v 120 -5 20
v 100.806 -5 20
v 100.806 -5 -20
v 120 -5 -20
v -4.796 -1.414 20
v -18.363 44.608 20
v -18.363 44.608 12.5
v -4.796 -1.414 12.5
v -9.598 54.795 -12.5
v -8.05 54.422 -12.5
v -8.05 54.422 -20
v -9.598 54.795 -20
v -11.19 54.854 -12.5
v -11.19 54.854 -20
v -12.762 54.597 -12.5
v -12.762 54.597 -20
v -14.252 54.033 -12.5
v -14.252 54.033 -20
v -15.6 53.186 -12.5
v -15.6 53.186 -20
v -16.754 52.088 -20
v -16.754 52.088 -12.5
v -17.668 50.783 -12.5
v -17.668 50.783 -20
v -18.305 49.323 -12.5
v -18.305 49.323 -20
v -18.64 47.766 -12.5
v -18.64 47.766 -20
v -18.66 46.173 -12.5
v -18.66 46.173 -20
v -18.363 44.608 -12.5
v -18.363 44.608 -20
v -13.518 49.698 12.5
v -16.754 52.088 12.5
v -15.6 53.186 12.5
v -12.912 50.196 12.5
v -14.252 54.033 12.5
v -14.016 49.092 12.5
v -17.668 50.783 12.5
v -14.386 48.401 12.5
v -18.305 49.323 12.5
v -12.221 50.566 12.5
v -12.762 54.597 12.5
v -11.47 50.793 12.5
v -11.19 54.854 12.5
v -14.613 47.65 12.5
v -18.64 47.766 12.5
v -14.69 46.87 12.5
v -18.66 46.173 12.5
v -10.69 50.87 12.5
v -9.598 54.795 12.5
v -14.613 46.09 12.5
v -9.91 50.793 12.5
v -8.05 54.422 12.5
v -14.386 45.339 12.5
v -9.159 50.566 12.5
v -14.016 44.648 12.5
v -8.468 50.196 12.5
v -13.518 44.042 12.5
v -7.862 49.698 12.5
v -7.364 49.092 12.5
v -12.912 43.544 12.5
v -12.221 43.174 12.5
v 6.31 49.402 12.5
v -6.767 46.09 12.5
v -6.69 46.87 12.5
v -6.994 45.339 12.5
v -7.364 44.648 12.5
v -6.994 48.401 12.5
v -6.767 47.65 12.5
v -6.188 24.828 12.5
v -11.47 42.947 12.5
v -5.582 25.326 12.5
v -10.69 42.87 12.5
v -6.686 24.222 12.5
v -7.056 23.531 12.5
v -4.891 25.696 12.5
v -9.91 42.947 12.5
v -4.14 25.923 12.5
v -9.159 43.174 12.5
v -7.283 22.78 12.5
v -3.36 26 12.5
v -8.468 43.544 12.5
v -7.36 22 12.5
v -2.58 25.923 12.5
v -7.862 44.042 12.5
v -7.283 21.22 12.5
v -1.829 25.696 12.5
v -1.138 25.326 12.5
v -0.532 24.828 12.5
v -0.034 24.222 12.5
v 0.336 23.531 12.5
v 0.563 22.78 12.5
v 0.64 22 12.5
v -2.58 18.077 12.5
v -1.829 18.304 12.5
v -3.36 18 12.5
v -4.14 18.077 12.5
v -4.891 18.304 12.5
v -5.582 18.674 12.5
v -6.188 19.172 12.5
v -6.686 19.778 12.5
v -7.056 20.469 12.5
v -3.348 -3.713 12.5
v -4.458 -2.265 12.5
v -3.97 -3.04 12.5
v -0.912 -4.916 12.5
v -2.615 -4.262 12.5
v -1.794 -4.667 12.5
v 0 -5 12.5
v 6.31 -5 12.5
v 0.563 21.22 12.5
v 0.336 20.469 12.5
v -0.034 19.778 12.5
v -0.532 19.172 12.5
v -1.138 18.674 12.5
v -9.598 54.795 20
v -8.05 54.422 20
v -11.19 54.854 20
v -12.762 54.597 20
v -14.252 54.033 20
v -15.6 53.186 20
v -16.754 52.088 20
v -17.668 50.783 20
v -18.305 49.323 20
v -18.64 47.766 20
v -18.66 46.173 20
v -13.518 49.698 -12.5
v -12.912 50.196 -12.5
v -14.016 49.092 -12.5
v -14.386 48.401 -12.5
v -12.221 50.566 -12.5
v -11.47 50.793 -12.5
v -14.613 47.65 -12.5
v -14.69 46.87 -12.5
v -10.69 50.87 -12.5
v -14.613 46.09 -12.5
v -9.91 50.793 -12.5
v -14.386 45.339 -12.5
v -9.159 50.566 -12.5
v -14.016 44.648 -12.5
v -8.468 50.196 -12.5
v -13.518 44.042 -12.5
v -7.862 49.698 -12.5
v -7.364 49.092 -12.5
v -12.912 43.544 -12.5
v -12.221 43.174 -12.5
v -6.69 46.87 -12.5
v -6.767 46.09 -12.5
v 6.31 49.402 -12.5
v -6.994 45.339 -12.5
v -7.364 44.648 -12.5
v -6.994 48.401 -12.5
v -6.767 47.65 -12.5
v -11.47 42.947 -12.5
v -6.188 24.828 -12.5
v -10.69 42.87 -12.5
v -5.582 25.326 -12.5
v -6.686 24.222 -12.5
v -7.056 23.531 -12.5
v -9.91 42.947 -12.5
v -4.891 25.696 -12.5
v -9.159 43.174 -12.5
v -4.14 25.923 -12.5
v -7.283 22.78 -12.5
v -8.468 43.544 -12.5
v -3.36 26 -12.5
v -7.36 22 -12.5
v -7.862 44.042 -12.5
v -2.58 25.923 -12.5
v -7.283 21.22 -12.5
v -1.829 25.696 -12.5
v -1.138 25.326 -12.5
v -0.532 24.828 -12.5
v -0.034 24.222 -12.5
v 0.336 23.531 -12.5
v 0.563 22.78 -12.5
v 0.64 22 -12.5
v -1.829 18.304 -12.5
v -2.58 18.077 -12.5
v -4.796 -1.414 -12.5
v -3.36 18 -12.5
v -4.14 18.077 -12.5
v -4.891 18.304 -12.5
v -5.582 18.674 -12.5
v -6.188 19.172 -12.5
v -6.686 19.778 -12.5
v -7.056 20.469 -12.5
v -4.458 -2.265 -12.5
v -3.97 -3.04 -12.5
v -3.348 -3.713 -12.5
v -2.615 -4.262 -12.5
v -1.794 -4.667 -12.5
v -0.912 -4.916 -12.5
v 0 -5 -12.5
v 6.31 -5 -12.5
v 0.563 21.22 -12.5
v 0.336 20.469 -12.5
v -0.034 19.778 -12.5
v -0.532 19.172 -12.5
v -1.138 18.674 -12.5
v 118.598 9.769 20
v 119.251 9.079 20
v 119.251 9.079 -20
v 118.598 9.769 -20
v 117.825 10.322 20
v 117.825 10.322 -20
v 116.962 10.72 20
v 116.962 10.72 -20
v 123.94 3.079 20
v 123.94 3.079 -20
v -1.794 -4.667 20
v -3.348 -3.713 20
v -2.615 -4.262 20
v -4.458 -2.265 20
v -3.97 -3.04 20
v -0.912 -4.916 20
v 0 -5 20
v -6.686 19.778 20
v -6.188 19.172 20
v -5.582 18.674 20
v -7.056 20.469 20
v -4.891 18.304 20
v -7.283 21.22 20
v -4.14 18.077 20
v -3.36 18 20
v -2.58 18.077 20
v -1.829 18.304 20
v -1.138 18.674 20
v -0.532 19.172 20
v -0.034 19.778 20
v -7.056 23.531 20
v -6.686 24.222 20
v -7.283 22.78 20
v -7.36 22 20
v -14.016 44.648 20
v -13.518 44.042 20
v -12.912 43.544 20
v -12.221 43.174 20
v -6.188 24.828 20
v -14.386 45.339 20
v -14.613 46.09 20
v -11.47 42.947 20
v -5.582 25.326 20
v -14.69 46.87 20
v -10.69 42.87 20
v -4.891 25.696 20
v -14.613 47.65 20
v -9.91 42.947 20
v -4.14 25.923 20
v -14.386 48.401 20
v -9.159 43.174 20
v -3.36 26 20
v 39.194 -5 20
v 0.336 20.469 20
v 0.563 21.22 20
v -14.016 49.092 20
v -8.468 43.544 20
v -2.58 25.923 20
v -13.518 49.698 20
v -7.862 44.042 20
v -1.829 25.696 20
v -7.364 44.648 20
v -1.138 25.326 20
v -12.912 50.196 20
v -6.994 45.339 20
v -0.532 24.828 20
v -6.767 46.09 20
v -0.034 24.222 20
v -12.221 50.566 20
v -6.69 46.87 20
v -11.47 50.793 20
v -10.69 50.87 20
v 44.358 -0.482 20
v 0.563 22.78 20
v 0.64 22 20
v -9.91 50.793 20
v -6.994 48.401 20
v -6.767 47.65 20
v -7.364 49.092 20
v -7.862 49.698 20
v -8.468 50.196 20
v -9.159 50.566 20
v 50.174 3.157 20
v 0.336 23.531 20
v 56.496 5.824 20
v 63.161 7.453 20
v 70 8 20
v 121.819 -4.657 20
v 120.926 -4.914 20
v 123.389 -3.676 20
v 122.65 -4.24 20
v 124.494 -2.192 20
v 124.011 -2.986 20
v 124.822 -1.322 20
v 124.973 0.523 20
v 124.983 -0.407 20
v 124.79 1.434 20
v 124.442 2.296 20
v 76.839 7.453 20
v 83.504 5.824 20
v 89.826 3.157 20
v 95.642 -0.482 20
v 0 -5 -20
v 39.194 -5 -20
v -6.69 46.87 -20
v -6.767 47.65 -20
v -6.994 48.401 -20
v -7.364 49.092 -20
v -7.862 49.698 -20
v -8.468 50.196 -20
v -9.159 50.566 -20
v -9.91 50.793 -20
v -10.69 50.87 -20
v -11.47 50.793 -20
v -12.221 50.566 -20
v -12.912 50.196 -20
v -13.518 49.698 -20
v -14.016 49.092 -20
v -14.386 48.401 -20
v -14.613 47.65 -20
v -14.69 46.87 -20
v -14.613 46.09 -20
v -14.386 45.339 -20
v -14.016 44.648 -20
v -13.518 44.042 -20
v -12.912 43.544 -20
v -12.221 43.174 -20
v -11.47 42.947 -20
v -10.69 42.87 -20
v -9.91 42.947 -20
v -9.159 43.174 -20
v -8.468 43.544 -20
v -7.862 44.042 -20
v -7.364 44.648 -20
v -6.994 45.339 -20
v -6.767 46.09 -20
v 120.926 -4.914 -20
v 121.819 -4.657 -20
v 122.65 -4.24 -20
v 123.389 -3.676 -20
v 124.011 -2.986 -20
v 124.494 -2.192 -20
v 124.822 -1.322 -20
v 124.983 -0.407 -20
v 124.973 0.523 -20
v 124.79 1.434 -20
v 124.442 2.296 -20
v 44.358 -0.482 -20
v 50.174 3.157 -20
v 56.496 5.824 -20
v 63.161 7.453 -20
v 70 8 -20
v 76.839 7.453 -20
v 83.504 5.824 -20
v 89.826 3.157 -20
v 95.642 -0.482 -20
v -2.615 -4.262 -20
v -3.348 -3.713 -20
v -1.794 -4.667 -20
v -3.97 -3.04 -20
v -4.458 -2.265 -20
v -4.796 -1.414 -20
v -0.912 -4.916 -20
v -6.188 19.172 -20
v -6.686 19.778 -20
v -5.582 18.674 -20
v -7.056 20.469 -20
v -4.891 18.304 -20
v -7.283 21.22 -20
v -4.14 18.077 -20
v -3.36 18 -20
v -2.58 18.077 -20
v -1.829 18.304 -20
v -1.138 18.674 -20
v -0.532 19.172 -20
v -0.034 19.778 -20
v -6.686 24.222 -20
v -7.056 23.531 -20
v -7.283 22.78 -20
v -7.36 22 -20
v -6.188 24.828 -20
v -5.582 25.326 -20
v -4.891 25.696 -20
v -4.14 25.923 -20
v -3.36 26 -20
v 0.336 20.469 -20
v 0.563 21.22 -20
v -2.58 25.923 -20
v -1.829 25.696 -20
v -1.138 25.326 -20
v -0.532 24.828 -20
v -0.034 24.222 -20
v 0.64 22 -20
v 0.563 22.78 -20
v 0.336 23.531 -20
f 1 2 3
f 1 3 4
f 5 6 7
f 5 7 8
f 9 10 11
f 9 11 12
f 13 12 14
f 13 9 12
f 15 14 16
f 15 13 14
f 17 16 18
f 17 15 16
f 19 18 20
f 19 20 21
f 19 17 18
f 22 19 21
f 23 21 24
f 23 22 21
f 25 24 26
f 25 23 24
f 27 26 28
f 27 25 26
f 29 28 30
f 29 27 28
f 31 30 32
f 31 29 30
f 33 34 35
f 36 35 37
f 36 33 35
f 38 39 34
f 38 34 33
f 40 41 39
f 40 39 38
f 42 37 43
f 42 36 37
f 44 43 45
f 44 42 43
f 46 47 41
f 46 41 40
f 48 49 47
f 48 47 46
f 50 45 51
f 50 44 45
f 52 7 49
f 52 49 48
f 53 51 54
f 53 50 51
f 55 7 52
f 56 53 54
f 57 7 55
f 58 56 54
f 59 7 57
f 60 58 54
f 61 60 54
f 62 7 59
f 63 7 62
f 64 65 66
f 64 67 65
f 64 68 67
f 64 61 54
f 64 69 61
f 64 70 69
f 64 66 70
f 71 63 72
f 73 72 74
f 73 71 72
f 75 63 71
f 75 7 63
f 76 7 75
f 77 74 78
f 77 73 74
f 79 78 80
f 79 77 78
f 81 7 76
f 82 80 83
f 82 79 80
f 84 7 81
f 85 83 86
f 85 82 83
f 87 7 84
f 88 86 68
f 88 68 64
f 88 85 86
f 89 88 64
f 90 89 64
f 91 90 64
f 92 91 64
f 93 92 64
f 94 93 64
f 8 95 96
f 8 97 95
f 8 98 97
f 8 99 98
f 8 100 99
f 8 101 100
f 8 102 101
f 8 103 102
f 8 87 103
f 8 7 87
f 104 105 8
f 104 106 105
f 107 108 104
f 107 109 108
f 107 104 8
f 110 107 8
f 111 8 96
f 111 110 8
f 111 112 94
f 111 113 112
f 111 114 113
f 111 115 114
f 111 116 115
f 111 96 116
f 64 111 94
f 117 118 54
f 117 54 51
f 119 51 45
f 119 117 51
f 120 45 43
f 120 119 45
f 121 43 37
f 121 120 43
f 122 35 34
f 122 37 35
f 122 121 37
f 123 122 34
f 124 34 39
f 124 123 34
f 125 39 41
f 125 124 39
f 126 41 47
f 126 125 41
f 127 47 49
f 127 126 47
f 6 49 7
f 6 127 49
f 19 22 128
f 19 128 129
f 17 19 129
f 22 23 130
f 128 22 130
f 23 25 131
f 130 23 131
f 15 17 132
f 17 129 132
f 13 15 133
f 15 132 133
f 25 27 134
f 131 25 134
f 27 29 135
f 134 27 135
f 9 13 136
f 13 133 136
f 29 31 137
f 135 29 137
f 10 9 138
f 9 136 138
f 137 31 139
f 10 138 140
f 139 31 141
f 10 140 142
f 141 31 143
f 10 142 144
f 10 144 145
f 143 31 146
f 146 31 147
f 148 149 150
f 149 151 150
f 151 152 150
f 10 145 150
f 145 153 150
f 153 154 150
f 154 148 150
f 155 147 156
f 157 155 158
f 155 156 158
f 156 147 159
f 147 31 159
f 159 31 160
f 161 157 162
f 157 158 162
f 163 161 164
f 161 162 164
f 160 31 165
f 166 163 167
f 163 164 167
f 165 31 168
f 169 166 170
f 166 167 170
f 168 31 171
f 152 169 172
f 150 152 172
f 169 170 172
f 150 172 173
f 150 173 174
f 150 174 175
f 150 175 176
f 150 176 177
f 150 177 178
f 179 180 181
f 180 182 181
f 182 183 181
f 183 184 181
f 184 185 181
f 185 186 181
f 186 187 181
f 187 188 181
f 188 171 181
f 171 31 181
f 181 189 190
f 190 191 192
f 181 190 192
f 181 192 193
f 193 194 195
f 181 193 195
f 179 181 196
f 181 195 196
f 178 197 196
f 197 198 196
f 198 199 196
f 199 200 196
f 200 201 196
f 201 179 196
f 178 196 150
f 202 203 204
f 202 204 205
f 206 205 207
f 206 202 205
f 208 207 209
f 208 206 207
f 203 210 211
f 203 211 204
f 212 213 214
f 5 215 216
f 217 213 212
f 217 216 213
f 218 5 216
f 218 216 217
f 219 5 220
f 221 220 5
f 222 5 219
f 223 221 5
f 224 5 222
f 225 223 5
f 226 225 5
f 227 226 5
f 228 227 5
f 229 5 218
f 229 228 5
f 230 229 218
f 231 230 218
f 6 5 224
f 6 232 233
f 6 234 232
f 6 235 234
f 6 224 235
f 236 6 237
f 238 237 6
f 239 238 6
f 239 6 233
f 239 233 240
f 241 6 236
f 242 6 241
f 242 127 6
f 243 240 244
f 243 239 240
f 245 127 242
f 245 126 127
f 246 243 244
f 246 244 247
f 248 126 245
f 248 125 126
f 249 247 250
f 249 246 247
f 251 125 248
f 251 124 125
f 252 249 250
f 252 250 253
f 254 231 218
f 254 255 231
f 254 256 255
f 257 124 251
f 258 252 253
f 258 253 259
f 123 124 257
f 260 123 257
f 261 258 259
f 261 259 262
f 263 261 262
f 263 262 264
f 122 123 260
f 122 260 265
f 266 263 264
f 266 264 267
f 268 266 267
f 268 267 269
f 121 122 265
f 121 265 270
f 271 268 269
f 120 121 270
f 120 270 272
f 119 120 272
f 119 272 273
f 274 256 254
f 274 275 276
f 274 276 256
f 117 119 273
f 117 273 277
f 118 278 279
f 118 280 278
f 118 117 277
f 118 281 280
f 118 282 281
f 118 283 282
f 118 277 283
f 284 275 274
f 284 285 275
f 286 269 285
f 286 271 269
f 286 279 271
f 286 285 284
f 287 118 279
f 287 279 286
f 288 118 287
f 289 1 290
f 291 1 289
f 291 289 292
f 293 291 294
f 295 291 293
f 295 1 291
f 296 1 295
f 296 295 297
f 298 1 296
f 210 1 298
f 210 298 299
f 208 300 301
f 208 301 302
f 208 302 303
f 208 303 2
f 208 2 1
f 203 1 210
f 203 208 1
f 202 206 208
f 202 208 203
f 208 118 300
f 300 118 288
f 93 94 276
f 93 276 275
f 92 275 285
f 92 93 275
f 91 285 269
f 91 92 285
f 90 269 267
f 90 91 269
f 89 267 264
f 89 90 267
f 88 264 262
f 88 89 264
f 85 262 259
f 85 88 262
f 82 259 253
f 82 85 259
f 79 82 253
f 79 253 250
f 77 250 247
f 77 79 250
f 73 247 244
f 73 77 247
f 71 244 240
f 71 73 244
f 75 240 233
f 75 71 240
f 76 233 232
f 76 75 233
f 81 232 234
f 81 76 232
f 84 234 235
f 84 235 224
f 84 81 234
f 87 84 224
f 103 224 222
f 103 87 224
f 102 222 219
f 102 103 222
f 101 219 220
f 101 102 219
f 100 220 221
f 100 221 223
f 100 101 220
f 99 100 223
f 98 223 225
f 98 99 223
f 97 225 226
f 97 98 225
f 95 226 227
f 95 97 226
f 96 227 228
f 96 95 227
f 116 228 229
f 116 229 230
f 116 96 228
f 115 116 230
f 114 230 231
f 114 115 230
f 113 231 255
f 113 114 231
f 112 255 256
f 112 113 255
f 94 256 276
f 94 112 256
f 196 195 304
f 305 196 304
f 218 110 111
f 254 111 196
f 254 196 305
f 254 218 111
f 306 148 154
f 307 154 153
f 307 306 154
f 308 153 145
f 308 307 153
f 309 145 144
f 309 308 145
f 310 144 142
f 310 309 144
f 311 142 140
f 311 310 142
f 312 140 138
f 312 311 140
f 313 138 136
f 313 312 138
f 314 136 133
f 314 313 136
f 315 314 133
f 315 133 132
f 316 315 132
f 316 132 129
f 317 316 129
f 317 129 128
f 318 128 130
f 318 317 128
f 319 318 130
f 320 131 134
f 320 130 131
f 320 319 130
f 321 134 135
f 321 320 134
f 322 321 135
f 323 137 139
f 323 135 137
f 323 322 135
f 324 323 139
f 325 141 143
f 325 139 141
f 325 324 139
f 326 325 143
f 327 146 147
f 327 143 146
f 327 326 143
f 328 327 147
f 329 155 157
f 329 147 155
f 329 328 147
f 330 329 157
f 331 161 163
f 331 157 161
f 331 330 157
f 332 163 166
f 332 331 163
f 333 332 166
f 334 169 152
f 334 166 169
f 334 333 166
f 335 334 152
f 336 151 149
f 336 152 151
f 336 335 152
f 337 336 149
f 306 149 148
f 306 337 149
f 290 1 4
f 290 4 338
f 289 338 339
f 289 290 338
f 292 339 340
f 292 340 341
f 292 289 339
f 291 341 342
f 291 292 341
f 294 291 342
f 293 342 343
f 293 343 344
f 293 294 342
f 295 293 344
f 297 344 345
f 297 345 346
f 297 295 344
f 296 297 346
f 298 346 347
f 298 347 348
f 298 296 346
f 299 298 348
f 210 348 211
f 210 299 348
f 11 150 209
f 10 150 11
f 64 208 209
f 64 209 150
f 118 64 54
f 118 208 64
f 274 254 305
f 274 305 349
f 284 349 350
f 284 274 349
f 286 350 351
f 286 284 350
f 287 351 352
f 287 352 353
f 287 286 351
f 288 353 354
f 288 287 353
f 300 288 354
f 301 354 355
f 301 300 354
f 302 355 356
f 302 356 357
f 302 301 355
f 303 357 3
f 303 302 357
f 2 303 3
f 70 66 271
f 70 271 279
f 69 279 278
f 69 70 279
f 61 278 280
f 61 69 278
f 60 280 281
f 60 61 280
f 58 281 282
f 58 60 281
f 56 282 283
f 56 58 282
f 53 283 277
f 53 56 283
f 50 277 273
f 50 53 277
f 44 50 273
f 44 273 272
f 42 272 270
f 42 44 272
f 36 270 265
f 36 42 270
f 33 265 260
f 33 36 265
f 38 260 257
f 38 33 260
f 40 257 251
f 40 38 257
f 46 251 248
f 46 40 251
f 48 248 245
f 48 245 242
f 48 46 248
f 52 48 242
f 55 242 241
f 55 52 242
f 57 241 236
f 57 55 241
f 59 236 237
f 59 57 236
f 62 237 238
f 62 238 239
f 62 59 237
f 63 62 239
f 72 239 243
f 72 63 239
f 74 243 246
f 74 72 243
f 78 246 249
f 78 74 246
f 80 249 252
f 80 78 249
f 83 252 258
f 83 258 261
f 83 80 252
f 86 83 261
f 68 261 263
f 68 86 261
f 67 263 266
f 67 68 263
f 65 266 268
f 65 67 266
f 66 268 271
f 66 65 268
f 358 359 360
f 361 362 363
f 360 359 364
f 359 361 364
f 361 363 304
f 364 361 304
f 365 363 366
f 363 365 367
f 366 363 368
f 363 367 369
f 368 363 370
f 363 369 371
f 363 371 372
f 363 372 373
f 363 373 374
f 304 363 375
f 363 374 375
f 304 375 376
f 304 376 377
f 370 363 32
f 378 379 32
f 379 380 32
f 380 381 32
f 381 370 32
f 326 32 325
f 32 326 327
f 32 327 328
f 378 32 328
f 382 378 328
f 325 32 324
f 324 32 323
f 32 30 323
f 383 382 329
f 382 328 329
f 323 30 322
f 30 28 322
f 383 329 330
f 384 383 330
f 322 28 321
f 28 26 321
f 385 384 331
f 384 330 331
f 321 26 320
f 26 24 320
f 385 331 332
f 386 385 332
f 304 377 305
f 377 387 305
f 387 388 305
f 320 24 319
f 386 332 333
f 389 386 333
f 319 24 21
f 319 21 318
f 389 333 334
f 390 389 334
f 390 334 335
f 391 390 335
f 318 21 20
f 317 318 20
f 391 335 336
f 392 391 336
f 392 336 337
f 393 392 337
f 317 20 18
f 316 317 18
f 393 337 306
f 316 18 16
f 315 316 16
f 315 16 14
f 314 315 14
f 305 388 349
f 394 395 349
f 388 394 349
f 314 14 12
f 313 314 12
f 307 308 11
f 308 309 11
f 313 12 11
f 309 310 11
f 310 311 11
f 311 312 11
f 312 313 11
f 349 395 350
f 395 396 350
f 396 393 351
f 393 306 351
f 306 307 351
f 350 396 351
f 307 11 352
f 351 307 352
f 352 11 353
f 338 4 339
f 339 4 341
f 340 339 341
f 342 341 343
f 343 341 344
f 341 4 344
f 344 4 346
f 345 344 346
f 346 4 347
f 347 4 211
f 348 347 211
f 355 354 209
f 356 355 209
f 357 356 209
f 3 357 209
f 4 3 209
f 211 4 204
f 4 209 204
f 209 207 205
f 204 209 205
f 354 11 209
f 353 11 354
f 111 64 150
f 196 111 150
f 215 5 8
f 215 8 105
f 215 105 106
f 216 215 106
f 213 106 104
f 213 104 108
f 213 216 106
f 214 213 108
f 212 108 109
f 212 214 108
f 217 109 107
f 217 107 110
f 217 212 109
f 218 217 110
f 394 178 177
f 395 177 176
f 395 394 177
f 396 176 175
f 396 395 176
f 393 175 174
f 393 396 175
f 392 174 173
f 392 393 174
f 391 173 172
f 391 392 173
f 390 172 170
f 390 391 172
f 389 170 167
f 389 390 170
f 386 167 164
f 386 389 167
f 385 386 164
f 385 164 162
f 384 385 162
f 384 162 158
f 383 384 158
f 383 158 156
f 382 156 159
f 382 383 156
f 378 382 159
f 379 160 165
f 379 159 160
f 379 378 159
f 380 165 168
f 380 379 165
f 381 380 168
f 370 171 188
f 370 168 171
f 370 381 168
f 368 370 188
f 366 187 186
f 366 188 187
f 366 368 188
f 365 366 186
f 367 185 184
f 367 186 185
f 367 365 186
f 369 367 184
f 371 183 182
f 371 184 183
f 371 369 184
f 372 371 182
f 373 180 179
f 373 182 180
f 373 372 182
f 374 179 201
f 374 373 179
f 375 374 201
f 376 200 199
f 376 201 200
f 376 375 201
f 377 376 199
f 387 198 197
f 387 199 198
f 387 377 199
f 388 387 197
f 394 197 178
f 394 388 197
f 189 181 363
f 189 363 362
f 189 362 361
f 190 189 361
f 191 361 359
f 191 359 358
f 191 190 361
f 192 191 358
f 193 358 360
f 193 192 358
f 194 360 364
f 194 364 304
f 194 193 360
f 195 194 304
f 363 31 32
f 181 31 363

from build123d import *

# Parameters (mm, degrees)
SKETCH1_R               = 4
BOSS_EXTRUDE1_DEPTH     = 20
CUT_EXTRUDE1_DEPTH      = 138.969985504
CUT_EXTRUDE1_DEPTH_BACK = 138.969985504
SKETCH3_W               = 25
SKETCH3_H               = 25


with BuildPart() as part:
    # Sketch1 → Boss-Extrude1 (new, symmetric)
    with BuildSketch(Plane.XY):
        with BuildLine():
            Line((0, -5), (39.194156399, -5))
            ThreePointArc((39.194156399, -5), (70, 8), (100.805843601, -5))
            Line((100.805843601, -5), (120, -5))
            ThreePointArc((120, -5), (124.494057443, -2.191676915), (123.939808781, 3.07862092))
            Line((123.939808781, 3.07862092), (119.251326027, 9.07862092))
            ThreePointArc((119.251326027, 9.07862092), (118.224409903, 10.063872091), (116.961517246, 10.71990466))
            Line((116.961517246, 10.71990466), (-8.05, 54.421847456))
            ThreePointArc((-8.05, 54.421847456), (-16.204790321, 52.665436802), (-18.363488412, 44.607794087))
            Line((-18.363488412, 44.607794087), (-4.795930257, -1.413878695))
            ThreePointArc((-4.795930257, -1.413878695), (-2.994211626, -4.004334744), (0, -5))
        make_face()
        with Locations((-3.36, 22)):
            Circle(SKETCH1_R, mode=Mode.SUBTRACT)
        with Locations((-10.69, 46.87)):
            Circle(SKETCH1_R, mode=Mode.SUBTRACT)
    extrude(amount=BOSS_EXTRUDE1_DEPTH, both=True)

    # Sketch3 → Cut-Extrude1 (cut, two sides: drawn at the far end of the back side and taken through both)
    with BuildSketch(Plane(origin=(0, 0, 0), x_dir=(1, 0, 0), z_dir=(0, 1, 0)).offset(-CUT_EXTRUDE1_DEPTH_BACK)):
        with Locations((-6.19, 0)):
            Rectangle(SKETCH3_W, SKETCH3_H)
    extrude(amount=CUT_EXTRUDE1_DEPTH + CUT_EXTRUDE1_DEPTH_BACK, mode=Mode.SUBTRACT)


solid = part.part
